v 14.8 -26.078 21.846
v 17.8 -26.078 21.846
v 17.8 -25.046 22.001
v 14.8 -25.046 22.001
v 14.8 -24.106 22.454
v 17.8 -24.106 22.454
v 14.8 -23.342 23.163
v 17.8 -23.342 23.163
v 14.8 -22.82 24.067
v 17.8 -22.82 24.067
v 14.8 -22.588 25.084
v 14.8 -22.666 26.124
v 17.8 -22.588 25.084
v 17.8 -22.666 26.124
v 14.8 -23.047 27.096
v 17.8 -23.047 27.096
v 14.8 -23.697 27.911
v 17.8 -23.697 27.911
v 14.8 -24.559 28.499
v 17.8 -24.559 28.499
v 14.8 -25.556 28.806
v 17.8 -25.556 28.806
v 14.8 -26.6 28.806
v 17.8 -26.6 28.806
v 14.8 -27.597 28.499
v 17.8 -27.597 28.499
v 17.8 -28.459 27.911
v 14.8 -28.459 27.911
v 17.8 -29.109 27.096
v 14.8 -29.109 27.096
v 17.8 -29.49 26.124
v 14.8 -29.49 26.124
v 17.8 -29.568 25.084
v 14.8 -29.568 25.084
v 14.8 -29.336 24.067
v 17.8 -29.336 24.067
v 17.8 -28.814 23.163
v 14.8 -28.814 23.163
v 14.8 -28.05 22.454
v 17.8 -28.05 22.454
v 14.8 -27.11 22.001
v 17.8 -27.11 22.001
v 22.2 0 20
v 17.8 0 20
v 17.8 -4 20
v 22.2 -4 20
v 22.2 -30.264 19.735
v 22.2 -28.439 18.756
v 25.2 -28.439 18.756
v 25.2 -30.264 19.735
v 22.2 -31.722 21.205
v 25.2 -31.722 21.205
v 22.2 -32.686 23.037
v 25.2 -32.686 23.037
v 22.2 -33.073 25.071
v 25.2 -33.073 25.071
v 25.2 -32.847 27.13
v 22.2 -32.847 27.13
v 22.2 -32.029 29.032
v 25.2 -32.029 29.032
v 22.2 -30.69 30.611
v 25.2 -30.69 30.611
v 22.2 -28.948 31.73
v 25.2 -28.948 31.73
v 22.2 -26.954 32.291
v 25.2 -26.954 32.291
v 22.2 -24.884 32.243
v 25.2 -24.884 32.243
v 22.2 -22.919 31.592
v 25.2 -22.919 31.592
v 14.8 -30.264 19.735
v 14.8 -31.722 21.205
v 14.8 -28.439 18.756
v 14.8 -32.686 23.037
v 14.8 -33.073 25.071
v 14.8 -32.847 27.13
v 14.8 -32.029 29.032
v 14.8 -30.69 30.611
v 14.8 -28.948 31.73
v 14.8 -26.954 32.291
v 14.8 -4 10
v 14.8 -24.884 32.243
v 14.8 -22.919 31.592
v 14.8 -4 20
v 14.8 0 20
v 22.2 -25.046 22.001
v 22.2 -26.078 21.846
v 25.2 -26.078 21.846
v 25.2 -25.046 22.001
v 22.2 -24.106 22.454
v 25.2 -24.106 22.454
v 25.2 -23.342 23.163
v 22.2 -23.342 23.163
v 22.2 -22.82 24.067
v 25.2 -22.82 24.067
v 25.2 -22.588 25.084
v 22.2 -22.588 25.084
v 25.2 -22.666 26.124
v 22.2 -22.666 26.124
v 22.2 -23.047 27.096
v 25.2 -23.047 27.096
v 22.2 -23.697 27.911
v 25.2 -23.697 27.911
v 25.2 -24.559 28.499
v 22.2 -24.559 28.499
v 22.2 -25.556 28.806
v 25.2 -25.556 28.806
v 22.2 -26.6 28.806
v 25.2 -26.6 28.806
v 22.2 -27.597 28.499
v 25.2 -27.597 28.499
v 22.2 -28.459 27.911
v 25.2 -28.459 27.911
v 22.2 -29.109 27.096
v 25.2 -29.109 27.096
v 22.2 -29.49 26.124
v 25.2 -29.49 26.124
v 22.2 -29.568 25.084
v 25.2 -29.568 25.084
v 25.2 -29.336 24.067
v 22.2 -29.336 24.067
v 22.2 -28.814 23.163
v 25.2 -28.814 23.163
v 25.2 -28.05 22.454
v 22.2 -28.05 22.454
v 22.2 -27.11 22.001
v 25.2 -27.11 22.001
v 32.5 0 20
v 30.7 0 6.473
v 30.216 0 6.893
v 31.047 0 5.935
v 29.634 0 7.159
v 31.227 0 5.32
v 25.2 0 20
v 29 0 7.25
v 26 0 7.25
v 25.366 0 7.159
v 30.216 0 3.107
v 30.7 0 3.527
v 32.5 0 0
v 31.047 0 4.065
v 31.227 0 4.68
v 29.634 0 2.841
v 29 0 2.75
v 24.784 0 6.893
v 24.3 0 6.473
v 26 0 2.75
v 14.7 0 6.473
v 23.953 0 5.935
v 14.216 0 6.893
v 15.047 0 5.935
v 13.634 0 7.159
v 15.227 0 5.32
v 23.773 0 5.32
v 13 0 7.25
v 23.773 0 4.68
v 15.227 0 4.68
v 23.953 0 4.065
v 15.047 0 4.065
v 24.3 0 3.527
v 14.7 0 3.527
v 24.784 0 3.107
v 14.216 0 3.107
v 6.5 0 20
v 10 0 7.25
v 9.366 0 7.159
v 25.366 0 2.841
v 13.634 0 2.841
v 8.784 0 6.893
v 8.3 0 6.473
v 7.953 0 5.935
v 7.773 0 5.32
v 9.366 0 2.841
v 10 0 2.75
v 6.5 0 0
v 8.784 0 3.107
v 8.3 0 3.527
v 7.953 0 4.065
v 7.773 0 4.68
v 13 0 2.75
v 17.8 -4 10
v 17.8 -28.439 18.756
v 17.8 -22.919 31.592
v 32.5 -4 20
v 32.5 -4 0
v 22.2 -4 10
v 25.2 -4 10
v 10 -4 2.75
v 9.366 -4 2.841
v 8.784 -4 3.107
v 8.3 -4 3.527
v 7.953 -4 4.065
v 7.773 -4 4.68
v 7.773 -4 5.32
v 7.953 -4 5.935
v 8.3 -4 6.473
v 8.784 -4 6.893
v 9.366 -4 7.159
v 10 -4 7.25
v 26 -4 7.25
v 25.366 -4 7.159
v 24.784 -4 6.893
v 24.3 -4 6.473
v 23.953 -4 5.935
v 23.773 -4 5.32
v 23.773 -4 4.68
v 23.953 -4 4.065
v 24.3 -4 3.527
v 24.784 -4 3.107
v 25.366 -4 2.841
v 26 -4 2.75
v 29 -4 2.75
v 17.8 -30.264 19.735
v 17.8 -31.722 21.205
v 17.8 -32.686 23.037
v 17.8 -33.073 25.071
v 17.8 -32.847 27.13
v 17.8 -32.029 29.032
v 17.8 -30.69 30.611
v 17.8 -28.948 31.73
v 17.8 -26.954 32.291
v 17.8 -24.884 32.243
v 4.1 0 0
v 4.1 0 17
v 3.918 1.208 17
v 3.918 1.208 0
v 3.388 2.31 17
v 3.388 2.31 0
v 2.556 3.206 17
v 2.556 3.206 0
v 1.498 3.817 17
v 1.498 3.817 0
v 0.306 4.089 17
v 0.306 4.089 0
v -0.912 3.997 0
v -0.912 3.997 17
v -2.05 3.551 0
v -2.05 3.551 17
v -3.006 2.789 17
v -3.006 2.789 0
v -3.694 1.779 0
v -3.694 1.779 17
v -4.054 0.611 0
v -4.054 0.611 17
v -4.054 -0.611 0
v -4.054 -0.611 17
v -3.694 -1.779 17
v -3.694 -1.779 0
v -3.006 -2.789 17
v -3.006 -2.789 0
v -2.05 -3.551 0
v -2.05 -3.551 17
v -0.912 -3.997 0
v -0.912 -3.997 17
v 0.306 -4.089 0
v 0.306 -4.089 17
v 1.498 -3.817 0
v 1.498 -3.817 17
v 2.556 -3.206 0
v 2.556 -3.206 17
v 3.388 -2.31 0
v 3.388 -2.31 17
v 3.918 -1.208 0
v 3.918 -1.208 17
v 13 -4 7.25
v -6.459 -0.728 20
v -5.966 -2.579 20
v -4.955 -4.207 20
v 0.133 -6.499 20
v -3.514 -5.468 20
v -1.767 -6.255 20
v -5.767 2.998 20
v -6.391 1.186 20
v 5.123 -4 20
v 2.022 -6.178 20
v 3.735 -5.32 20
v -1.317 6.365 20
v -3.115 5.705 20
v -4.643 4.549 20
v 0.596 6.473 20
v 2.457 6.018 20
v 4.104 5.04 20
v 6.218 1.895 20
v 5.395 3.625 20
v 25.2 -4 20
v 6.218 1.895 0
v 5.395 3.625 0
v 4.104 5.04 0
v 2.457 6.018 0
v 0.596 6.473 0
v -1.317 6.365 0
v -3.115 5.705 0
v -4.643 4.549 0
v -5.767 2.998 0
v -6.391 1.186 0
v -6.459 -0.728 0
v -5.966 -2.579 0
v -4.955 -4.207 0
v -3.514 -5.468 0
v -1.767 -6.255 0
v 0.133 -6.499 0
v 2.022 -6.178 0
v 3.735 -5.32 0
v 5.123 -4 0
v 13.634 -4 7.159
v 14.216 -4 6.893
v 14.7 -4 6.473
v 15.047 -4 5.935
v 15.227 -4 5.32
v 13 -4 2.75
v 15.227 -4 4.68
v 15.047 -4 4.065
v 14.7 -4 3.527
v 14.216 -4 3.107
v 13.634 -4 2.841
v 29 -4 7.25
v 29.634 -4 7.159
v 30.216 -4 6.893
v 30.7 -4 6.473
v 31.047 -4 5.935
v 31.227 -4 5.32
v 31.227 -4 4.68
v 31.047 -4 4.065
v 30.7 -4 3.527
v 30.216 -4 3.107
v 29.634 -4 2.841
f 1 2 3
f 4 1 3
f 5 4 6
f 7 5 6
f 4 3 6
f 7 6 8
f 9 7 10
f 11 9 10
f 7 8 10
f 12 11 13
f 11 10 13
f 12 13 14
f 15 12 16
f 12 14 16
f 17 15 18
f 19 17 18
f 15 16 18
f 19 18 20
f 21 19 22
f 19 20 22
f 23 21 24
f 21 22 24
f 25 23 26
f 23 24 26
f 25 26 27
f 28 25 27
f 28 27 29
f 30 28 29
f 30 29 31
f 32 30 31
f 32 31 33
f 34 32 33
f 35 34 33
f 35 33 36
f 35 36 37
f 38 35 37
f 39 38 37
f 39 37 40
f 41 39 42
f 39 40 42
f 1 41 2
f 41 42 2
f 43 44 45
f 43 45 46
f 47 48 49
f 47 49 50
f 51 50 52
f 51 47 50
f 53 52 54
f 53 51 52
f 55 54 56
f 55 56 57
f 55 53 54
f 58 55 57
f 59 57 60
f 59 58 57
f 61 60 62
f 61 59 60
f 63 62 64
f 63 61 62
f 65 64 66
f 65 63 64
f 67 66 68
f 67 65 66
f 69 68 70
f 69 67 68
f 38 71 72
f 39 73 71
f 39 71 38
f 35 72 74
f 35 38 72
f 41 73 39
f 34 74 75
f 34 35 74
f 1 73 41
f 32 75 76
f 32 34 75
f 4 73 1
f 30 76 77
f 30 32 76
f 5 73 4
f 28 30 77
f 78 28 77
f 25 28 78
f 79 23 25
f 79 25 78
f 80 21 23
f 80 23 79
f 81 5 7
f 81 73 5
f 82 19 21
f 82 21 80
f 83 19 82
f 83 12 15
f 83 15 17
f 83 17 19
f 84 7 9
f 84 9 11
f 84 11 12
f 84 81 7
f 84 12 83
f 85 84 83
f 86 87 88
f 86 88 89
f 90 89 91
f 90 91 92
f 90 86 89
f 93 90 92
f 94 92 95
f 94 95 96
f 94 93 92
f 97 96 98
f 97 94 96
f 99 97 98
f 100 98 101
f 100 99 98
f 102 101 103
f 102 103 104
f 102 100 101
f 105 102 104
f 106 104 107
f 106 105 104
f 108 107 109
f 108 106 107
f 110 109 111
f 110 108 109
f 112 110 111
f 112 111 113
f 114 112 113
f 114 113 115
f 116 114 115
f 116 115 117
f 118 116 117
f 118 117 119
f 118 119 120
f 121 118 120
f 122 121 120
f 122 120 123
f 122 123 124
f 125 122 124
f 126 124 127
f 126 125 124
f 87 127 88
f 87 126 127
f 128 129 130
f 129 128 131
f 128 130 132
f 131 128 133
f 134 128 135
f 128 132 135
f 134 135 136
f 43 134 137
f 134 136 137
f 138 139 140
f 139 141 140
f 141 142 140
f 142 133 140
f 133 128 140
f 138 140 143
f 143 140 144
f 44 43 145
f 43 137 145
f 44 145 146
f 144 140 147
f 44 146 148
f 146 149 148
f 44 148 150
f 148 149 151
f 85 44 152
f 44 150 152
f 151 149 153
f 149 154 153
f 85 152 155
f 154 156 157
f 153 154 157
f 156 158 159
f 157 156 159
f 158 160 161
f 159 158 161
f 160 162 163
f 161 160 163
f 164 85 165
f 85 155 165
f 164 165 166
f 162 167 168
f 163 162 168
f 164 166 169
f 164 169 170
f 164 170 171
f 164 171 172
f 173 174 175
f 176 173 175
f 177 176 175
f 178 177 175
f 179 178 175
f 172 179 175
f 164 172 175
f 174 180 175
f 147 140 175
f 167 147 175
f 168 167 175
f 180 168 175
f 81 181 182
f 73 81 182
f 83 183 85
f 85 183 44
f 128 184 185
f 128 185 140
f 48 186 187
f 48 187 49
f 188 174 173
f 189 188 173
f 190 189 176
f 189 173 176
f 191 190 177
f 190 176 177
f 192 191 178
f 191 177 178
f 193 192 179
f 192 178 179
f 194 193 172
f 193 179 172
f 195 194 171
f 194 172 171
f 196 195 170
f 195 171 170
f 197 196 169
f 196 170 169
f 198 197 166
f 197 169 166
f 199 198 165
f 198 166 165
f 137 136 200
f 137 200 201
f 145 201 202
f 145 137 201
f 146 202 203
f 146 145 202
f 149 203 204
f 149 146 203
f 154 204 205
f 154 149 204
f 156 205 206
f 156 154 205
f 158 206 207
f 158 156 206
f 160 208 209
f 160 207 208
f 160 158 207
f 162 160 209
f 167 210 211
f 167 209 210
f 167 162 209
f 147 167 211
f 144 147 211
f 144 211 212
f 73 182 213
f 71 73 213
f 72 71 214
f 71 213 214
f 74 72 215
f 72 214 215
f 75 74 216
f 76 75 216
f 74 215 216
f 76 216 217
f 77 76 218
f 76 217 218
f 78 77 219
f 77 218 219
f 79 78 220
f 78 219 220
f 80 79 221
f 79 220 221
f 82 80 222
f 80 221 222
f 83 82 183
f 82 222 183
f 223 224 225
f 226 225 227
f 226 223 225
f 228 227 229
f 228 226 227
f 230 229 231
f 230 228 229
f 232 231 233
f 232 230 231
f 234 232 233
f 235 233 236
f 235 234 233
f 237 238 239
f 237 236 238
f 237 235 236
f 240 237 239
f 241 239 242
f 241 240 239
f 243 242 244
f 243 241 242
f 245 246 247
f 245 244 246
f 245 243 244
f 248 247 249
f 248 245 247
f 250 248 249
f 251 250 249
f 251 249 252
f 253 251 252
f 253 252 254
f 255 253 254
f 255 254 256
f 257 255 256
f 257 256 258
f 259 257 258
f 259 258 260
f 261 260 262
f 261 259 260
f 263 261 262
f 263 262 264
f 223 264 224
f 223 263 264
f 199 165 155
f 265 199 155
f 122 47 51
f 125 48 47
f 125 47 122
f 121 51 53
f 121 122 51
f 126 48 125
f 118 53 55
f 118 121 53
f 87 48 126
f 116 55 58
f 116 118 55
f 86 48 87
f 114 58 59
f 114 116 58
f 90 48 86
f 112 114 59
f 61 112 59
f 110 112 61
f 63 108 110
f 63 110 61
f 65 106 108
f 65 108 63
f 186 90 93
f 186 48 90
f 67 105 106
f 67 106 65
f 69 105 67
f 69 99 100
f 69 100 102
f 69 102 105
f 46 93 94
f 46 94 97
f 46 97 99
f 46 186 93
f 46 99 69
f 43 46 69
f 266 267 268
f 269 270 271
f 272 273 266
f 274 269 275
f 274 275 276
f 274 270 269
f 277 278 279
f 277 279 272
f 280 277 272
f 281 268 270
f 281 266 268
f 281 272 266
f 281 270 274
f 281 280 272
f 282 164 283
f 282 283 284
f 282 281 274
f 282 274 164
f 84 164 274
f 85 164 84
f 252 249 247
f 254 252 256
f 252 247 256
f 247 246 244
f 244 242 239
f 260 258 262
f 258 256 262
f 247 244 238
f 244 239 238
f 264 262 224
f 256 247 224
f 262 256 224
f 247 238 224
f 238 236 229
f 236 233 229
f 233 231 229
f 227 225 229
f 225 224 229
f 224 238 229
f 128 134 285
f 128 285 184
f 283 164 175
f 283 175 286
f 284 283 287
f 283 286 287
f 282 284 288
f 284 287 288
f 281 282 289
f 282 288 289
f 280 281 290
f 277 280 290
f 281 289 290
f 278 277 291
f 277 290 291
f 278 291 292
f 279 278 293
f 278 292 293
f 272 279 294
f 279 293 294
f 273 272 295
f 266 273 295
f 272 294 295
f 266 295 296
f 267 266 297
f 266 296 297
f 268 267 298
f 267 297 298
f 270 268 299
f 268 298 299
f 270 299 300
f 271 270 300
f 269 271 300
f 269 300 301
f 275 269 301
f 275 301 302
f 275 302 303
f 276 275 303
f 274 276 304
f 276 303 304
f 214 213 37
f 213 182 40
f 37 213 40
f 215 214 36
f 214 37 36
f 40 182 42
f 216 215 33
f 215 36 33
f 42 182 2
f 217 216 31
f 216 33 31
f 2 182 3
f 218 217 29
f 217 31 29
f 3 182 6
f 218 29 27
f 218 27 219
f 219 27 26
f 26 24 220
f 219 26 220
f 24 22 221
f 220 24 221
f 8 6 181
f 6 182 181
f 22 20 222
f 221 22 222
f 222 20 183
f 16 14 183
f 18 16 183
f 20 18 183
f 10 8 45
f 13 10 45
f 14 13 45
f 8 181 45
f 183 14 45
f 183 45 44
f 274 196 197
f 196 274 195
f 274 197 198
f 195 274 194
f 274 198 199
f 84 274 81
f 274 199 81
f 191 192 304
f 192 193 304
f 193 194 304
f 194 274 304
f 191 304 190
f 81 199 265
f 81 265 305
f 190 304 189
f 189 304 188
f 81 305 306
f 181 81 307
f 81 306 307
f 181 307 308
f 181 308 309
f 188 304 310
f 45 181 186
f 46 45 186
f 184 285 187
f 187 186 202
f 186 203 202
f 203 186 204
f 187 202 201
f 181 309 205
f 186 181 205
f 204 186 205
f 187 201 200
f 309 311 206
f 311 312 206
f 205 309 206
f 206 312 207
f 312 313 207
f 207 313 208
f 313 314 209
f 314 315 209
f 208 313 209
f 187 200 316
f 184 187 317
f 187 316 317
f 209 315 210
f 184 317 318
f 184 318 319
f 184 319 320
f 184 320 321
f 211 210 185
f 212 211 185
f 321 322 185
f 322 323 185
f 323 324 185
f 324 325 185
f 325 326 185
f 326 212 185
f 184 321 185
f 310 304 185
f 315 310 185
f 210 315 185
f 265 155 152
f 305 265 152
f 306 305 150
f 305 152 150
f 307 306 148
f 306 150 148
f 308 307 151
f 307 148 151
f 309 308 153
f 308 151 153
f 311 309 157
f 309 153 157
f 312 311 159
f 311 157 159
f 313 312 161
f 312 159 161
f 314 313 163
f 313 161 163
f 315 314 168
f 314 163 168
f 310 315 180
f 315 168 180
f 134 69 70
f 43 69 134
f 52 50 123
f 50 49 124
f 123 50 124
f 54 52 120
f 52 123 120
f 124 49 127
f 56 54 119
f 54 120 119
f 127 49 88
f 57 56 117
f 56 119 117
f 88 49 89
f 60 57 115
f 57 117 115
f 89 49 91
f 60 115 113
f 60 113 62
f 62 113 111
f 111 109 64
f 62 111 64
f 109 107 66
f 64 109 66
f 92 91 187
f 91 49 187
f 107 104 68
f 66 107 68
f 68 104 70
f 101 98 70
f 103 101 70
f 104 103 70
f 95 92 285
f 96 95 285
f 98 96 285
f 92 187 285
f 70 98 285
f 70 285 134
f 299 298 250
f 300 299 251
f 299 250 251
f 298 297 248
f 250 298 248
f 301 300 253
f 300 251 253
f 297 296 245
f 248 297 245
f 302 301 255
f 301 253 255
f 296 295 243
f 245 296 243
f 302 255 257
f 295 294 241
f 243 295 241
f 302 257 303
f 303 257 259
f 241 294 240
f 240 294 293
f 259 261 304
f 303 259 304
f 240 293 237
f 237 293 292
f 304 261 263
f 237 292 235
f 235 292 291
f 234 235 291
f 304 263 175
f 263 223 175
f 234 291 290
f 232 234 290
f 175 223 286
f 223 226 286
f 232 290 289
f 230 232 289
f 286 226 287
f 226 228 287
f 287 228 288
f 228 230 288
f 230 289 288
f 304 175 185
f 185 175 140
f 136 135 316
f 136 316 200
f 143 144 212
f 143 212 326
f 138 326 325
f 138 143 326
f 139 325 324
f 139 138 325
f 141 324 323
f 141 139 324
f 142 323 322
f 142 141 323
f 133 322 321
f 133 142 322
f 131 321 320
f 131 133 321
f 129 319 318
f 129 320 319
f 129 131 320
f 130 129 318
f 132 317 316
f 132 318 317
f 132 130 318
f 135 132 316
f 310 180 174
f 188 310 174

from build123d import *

# Parameters (mm, degrees)
SKETCH_1_R          = 4.1
EXTRUDE_1_DEPTH     = 20
SKETCH_2_R          = 4.923200542
EXTRUDE_2_DEPTH     = 3
CUT_EXTRUDE_1_DEPTH = 13
SKETCH_6_R          = 3.5
EXTRUDE_3_DEPTH     = 3


with BuildPart() as part:
    # Эскиз1 → Бобышка-Вытянуть1 (new body)
    with BuildSketch(Plane.XY):
        with BuildLine():
            Line((5.123475383, -4), (32.5, -4))
            Line((32.5, -4), (32.5, 0))
            Line((32.5, 0), (6.5, 0))
            ThreePointArc((6.5, 0), (-6.146242348, 2.115113473), (5.123475383, -4))
        make_face()
        Circle(SKETCH_1_R, mode=Mode.SUBTRACT)
    extrude(amount=EXTRUDE_1_DEPTH)

    # Эскиз2 → Бобышка-Вытянуть2 (add)
    with BuildSketch(Plane.XY.offset(20)):
        Circle(SKETCH_2_R)
    extrude(amount=-EXTRUDE_2_DEPTH)

    # Эскиз3 → Вырез-Вытянуть1 (cut)
    with BuildSketch(Plane(origin=(0, 0, 0), x_dir=(1, 0, 0), z_dir=(0, 1, 0))):
        with BuildLine():
            Line((10, -7.25), (13, -7.25))
            ThreePointArc((13, -7.25), (15.25, -5), (13, -2.75))
            Line((13, -2.75), (10, -2.75))
            ThreePointArc((10, -2.75), (7.75, -5), (10, -7.25))
        make_face()
        with BuildLine():
            Line((26, -2.75), (29, -2.75))
            ThreePointArc((29, -2.75), (31.25, -5), (29, -7.25))
            Line((29, -7.25), (26, -7.25))
            ThreePointArc((26, -7.25), (23.75, -5), (26, -2.75))
        make_face()
    extrude(amount=-CUT_EXTRUDE_1_DEPTH, mode=Mode.SUBTRACT)

    # Эскиз6 → Бобышка-Вытянуть3 (add)
    with BuildSketch(Plane(origin=(22.2, 0, 0), x_dir=(0, 0, -1), z_dir=(1, 0, 0))):
        with BuildLine():
            Line((-31.59202383, -22.918584172), (-20, 0))
            Line((-20, 0), (-10, -4))
            Line((-10, -4), (-18.755733241, -28.438927439))
            ThreePointArc((-18.755733241, -28.438927439), (-28.111077184, -32.508536772), (-31.59202383, -22.918584172))
        make_face()
        with Locations((-25.34557078, -26.077986693)):
            Circle(SKETCH_6_R, mode=Mode.SUBTRACT)
    extrude_3 = extrude(amount=EXTRUDE_3_DEPTH)

    # Зеркальное отражение1: Бобышка-Вытянуть3 across plane
    add(extrude_3.mirror(Plane(origin=(20, 0, 0), x_dir=(0, 0, 1), z_dir=(1, 0, 0))))


solid = part.part
